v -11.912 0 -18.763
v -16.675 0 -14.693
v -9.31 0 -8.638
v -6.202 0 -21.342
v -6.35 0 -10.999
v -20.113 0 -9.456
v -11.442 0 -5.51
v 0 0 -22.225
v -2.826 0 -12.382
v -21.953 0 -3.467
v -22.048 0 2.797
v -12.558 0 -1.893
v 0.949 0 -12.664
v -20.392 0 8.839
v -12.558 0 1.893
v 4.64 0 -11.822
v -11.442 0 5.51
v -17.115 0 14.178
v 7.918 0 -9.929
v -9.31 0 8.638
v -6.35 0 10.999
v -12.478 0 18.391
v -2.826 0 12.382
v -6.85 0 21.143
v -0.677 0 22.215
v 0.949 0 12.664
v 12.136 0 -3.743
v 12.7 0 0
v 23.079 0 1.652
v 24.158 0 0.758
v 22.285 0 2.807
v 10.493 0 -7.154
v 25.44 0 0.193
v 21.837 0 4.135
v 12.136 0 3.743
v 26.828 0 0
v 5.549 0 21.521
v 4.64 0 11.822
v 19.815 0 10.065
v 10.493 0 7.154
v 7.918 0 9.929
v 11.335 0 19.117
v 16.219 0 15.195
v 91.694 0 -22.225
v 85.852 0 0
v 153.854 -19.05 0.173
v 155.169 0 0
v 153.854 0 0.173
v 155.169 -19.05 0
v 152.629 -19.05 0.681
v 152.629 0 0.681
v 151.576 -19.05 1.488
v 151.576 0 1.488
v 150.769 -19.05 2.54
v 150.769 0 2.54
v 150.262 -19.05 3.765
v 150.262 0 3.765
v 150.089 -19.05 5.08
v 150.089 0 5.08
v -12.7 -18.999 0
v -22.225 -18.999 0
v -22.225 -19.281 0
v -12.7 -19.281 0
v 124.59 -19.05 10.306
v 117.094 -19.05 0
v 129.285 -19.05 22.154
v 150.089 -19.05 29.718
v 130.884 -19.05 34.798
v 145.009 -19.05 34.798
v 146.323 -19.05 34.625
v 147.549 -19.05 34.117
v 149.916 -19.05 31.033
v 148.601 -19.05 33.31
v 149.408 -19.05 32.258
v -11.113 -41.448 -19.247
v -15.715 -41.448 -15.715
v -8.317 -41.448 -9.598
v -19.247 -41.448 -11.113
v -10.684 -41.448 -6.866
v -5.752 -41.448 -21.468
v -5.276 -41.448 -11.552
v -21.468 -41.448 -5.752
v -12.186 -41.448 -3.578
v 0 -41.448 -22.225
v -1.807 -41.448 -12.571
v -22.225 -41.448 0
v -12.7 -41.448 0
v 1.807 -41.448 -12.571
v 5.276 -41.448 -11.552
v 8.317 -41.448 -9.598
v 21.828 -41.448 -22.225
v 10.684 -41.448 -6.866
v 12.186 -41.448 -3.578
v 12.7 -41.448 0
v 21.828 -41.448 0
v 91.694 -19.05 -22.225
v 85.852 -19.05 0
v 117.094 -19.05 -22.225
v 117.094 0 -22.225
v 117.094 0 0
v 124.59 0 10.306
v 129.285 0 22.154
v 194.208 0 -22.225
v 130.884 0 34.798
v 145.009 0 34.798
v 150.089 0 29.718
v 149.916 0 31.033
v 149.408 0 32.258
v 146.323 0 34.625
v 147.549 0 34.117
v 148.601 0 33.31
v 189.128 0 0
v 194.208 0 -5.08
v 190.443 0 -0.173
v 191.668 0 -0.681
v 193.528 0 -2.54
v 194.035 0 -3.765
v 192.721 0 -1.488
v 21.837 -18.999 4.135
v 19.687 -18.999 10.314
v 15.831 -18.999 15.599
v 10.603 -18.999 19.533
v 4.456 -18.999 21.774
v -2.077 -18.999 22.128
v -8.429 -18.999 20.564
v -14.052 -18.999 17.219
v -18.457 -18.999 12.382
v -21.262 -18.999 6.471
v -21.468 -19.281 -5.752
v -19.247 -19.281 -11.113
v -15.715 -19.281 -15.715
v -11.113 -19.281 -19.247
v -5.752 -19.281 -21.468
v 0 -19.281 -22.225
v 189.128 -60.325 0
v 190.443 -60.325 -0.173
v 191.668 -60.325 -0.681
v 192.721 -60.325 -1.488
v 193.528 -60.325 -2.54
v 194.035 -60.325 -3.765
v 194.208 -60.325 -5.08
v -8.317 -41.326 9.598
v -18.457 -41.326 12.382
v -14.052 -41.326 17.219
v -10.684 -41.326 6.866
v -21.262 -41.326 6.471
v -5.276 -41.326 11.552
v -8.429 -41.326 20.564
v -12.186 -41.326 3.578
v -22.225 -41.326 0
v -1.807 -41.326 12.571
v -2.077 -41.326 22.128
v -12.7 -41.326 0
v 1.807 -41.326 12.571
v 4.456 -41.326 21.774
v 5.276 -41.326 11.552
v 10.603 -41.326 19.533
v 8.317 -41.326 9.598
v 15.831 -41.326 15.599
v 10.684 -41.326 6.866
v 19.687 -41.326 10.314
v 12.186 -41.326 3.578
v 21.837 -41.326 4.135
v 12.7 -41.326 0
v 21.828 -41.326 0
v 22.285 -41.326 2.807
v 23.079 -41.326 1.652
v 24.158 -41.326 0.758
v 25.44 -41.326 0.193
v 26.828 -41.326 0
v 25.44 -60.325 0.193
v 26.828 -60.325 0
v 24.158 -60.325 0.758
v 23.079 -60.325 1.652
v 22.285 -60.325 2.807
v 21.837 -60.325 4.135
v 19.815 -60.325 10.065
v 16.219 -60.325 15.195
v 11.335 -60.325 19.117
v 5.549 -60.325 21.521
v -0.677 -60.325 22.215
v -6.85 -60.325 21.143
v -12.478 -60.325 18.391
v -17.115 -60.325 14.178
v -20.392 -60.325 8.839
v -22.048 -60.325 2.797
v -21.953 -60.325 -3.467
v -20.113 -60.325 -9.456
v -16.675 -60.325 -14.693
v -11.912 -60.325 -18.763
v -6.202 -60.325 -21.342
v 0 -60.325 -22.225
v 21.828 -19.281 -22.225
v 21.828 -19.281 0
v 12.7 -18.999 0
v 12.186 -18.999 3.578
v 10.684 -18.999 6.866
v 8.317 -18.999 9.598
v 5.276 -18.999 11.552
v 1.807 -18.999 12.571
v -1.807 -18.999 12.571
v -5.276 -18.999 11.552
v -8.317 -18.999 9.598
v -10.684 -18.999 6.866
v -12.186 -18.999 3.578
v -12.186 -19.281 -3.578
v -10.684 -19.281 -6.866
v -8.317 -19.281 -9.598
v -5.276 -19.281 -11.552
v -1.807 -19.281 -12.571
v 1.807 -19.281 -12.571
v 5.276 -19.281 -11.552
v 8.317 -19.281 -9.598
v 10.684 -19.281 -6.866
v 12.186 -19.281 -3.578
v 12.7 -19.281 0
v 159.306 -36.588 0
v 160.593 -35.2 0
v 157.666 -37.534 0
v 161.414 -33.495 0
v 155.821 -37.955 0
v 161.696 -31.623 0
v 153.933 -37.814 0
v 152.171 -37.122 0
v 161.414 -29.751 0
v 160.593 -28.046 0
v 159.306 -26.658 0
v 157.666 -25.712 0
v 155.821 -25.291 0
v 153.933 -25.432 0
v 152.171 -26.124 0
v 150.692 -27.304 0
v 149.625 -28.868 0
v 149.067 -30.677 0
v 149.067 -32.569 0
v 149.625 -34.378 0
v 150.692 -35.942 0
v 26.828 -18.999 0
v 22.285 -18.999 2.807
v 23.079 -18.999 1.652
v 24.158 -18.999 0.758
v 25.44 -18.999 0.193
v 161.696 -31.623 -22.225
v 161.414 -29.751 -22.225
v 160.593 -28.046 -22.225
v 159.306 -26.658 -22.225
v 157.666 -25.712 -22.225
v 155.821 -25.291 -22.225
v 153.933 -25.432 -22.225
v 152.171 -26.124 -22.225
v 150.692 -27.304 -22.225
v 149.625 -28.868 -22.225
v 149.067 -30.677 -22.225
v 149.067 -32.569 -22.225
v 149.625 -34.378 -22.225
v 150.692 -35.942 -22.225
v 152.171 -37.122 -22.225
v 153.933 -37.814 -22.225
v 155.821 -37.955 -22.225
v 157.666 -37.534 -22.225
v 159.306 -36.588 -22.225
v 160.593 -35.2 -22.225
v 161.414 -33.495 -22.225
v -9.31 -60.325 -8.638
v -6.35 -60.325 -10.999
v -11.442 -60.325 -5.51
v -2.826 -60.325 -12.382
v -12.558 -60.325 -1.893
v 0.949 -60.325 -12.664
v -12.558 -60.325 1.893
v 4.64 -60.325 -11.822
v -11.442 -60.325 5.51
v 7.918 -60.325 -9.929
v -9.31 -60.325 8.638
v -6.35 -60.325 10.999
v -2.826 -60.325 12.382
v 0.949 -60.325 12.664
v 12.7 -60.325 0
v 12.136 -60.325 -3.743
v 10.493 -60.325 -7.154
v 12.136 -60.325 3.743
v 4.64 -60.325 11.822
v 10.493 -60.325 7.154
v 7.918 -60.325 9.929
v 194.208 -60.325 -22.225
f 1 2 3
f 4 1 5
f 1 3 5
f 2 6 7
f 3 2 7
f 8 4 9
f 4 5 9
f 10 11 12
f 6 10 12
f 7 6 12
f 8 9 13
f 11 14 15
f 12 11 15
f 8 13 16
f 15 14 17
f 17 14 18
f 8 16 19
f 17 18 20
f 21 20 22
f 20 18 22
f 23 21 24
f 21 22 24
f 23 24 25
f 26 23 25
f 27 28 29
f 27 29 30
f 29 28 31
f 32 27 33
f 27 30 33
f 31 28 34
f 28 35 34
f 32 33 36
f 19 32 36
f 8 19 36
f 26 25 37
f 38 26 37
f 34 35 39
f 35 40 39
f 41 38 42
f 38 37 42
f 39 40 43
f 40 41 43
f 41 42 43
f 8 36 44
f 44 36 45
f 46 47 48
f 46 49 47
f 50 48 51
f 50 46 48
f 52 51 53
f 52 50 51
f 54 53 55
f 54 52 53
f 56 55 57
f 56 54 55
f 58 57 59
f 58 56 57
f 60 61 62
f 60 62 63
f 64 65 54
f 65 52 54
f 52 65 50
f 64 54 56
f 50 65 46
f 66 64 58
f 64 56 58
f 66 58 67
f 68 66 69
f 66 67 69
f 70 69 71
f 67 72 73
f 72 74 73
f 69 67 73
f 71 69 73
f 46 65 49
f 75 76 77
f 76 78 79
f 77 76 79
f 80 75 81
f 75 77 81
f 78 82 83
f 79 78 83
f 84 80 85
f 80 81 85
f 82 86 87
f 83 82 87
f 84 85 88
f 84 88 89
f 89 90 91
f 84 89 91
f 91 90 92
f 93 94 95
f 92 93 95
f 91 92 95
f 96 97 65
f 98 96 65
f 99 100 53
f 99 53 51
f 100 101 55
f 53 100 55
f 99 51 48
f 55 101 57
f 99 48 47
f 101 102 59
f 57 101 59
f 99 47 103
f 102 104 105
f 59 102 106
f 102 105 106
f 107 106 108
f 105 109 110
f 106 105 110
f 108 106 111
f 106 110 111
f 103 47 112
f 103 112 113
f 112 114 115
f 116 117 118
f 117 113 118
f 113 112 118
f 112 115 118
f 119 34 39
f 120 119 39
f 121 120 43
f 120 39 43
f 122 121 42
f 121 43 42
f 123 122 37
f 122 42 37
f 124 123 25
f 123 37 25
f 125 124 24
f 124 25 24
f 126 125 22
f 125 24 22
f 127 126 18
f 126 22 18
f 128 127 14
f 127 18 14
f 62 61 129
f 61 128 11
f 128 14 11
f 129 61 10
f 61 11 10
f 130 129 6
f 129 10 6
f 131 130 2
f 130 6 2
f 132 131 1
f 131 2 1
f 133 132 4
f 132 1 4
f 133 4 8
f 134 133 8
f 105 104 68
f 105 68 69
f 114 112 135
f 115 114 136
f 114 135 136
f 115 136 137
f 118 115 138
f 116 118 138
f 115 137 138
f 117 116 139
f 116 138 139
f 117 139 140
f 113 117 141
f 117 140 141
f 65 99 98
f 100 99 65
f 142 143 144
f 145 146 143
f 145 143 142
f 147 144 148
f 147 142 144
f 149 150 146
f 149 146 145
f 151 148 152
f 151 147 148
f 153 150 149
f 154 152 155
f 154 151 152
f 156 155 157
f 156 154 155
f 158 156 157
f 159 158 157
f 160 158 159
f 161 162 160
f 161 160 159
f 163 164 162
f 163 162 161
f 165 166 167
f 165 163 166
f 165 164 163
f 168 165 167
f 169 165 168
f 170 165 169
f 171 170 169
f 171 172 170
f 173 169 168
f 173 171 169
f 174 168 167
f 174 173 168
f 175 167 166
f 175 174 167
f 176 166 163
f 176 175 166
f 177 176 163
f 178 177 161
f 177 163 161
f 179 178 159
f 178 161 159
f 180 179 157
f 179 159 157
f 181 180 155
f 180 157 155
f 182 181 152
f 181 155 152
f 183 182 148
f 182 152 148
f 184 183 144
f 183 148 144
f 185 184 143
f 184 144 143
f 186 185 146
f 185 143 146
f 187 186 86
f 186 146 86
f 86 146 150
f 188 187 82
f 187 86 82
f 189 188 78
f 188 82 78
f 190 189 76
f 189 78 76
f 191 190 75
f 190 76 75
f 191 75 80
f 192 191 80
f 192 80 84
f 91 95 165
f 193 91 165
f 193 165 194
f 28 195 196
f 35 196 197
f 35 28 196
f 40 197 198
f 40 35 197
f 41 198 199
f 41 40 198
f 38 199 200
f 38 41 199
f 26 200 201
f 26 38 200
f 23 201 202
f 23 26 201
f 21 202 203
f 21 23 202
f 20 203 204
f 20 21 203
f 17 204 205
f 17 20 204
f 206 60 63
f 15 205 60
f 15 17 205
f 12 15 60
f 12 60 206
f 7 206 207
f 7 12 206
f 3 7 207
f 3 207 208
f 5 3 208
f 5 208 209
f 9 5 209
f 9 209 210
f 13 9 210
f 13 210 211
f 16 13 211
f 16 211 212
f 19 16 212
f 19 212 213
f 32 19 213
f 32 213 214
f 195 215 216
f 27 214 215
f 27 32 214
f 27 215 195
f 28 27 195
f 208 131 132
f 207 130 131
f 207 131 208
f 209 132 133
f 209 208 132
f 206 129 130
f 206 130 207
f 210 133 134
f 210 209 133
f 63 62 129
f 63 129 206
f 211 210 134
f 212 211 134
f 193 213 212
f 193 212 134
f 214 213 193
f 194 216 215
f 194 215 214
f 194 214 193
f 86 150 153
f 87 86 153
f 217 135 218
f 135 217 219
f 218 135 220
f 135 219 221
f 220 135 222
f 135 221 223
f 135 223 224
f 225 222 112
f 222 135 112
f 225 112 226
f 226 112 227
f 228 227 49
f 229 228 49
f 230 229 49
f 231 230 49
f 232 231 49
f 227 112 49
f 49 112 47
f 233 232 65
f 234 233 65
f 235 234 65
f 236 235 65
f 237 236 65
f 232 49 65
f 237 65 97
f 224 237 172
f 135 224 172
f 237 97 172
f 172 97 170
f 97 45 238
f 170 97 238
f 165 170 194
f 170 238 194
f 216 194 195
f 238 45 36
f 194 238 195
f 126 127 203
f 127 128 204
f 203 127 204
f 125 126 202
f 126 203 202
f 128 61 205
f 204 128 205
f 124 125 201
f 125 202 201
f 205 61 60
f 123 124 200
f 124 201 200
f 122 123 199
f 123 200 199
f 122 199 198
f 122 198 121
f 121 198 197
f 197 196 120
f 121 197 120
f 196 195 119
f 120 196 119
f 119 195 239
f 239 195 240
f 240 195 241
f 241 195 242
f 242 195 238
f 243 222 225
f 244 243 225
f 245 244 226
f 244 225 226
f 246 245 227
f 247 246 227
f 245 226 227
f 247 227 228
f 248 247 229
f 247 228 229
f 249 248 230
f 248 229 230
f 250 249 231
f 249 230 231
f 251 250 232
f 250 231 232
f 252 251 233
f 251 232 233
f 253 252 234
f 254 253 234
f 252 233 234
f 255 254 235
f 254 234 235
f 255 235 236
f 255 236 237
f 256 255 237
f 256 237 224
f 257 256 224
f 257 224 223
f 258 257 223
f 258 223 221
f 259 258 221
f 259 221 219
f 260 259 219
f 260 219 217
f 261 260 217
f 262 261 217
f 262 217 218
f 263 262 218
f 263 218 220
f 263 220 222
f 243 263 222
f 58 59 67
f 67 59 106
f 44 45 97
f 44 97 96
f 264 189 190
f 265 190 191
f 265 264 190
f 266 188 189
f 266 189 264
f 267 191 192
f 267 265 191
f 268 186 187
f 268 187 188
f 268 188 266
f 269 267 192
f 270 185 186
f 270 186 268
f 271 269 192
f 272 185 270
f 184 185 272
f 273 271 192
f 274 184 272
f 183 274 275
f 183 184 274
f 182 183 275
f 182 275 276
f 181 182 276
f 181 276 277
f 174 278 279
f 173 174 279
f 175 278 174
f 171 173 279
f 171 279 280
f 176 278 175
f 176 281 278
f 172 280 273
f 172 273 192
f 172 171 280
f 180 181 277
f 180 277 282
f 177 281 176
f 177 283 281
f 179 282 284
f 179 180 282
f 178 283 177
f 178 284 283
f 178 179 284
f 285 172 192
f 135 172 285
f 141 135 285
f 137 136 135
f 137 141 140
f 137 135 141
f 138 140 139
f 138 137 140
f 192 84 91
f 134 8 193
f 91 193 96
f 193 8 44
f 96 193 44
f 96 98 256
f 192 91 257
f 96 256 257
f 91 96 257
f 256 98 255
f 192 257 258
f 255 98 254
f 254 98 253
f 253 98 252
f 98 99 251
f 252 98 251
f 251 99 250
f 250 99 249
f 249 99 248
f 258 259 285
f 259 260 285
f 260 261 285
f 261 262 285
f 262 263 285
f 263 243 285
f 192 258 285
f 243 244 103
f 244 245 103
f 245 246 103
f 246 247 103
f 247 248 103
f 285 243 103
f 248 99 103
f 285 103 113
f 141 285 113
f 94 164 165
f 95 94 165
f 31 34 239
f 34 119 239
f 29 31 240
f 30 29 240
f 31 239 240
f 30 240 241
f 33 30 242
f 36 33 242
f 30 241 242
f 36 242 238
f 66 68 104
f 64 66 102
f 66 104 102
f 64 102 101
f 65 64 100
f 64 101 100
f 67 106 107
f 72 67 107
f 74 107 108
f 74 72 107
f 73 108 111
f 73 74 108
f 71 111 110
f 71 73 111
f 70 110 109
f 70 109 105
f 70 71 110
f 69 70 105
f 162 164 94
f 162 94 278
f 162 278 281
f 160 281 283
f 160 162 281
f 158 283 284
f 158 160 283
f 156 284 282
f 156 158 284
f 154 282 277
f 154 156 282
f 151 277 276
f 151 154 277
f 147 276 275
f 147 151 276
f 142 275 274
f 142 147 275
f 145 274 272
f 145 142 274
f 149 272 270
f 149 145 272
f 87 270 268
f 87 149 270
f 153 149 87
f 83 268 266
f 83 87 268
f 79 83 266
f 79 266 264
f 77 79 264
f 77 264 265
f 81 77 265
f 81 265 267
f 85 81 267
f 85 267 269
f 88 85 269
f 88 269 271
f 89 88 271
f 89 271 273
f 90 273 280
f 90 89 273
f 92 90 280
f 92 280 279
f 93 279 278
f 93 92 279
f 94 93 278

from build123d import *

# Parameters (mm, degrees)
F0_R      = 12.7
F0_W      = 19.2045877871
F0_H      = 34.798
F1_DEPTH  = 60.325
F2_W      = 54.1596032441
F2_H      = 22.3266
F3_DEPTH  = 34.799
F4_W      = 44.103635475
F4_H      = 22.1672710031
F5_DEPTH  = 25.4
F6_DEPTH  = 19.05
F7_DEPTH  = 19.05
F8_W      = 41.275
F8_H      = 34.798
F9_DEPTH  = 50.8
F10_R     = 6.35
F11_DEPTH = 22.226
F12_R     = 5.08


with BuildPart() as f1:
    # F0 (on Front) → F1 (new body)
    with BuildSketch(Plane.XZ):
        with BuildLine():
            Line((85.852, 0), (22.225, 0))
            ThreePointArc((22.225, 0), (15.7154482119, -15.7154482119), (0, -22.225))
            Line((0, -22.225), (91.694, -22.225))
            Line((91.694, -22.225), (85.852, 0))
        make_face()
        with BuildLine():
            ThreePointArc((0, -22.225), (15.7154482119, -15.7154482119), (22.225, 0))
            ThreePointArc((22.225, 0), (-15.7154482119, 15.7154482119), (0, -22.225))
        make_face()
        Circle(F0_R, mode=Mode.SUBTRACT)
        Polygon((130.8840122129, 0), (117.094, 0), (117.094, -22.225), (194.2084, -22.225), (194.2084, 0), (150.0886, 0), align=None)
        Polygon((117.094, 0), (85.852, 0), (91.694, -22.225), (117.094, -22.225), align=None)
        with BuildLine():
            ThreePointArc((130.8840122129, 34.798), (127.3108445203, 16.0825969798), (117.094, 0))
            Line((117.094, 0), (130.8840122129, 0))
            Line((130.8840122129, 0), (130.8840122129, 34.798))
        make_face()
        with Locations((140.4863061065, 17.399)):
            Rectangle(F0_W, F0_H)
    extrude(amount=F1_DEPTH)

    # F2 (on Top) → F3 (cut, through all)
    with BuildSketch(Plane.XY):
        with Locations((0.2378355712, -30.1625)):
            Rectangle(F2_W, F2_H)
    extrude(amount=F3_DEPTH, mode=Mode.SUBTRACT)

    # F4 (on Top) → F5 (cut)
    with BuildSketch(Plane.XY):
        with Locations((-0.2239840105, -30.3645441309)):
            Rectangle(F4_W, F4_H)
    extrude(amount=-F5_DEPTH, mode=Mode.SUBTRACT)

    # F0 (on Front) → F6 (cut)
    with BuildSketch(Plane.XZ):
        Polygon((117.094, 0), (85.852, 0), (91.694, -22.225), (117.094, -22.225), align=None)
    extrude(amount=-F6_DEPTH, mode=Mode.SUBTRACT)

    # F0 (on Front) → F7 (cut)
    with BuildSketch(Plane.XZ):
        Polygon((117.094, 0), (85.852, 0), (91.694, -22.225), (117.094, -22.225), align=None)
    extrude(amount=F7_DEPTH, mode=Mode.SUBTRACT)

    # F8 (on face) → F9 (cut)
    with BuildSketch(Plane.YZ.offset(150.0886)):
        with Locations((-39.6875, 17.399)):
            Rectangle(F8_W, F8_H)
    extrude(amount=-F9_DEPTH, mode=Mode.SUBTRACT)

    # F10 (on face) → F11 (cut, through all)
    with BuildSketch(Plane.XY):
        with Locations((155.3464, -31.623)):
            Circle(F10_R)
    extrude(amount=-F11_DEPTH, mode=Mode.SUBTRACT)

    # F12
    f12_edges = [f1.edges().sort_by_distance(p)[0] for p in [
        (150.0886, -9.525, 34.798),
        (150.0886, -9.525, 0),
        (194.2084, -30.1625, 0),
        (22.225, -50.8254, 0),
        (22.225, -9.4996, 0),
    ]]
    fillet(f12_edges, radius=F12_R)


solid = f1.part
